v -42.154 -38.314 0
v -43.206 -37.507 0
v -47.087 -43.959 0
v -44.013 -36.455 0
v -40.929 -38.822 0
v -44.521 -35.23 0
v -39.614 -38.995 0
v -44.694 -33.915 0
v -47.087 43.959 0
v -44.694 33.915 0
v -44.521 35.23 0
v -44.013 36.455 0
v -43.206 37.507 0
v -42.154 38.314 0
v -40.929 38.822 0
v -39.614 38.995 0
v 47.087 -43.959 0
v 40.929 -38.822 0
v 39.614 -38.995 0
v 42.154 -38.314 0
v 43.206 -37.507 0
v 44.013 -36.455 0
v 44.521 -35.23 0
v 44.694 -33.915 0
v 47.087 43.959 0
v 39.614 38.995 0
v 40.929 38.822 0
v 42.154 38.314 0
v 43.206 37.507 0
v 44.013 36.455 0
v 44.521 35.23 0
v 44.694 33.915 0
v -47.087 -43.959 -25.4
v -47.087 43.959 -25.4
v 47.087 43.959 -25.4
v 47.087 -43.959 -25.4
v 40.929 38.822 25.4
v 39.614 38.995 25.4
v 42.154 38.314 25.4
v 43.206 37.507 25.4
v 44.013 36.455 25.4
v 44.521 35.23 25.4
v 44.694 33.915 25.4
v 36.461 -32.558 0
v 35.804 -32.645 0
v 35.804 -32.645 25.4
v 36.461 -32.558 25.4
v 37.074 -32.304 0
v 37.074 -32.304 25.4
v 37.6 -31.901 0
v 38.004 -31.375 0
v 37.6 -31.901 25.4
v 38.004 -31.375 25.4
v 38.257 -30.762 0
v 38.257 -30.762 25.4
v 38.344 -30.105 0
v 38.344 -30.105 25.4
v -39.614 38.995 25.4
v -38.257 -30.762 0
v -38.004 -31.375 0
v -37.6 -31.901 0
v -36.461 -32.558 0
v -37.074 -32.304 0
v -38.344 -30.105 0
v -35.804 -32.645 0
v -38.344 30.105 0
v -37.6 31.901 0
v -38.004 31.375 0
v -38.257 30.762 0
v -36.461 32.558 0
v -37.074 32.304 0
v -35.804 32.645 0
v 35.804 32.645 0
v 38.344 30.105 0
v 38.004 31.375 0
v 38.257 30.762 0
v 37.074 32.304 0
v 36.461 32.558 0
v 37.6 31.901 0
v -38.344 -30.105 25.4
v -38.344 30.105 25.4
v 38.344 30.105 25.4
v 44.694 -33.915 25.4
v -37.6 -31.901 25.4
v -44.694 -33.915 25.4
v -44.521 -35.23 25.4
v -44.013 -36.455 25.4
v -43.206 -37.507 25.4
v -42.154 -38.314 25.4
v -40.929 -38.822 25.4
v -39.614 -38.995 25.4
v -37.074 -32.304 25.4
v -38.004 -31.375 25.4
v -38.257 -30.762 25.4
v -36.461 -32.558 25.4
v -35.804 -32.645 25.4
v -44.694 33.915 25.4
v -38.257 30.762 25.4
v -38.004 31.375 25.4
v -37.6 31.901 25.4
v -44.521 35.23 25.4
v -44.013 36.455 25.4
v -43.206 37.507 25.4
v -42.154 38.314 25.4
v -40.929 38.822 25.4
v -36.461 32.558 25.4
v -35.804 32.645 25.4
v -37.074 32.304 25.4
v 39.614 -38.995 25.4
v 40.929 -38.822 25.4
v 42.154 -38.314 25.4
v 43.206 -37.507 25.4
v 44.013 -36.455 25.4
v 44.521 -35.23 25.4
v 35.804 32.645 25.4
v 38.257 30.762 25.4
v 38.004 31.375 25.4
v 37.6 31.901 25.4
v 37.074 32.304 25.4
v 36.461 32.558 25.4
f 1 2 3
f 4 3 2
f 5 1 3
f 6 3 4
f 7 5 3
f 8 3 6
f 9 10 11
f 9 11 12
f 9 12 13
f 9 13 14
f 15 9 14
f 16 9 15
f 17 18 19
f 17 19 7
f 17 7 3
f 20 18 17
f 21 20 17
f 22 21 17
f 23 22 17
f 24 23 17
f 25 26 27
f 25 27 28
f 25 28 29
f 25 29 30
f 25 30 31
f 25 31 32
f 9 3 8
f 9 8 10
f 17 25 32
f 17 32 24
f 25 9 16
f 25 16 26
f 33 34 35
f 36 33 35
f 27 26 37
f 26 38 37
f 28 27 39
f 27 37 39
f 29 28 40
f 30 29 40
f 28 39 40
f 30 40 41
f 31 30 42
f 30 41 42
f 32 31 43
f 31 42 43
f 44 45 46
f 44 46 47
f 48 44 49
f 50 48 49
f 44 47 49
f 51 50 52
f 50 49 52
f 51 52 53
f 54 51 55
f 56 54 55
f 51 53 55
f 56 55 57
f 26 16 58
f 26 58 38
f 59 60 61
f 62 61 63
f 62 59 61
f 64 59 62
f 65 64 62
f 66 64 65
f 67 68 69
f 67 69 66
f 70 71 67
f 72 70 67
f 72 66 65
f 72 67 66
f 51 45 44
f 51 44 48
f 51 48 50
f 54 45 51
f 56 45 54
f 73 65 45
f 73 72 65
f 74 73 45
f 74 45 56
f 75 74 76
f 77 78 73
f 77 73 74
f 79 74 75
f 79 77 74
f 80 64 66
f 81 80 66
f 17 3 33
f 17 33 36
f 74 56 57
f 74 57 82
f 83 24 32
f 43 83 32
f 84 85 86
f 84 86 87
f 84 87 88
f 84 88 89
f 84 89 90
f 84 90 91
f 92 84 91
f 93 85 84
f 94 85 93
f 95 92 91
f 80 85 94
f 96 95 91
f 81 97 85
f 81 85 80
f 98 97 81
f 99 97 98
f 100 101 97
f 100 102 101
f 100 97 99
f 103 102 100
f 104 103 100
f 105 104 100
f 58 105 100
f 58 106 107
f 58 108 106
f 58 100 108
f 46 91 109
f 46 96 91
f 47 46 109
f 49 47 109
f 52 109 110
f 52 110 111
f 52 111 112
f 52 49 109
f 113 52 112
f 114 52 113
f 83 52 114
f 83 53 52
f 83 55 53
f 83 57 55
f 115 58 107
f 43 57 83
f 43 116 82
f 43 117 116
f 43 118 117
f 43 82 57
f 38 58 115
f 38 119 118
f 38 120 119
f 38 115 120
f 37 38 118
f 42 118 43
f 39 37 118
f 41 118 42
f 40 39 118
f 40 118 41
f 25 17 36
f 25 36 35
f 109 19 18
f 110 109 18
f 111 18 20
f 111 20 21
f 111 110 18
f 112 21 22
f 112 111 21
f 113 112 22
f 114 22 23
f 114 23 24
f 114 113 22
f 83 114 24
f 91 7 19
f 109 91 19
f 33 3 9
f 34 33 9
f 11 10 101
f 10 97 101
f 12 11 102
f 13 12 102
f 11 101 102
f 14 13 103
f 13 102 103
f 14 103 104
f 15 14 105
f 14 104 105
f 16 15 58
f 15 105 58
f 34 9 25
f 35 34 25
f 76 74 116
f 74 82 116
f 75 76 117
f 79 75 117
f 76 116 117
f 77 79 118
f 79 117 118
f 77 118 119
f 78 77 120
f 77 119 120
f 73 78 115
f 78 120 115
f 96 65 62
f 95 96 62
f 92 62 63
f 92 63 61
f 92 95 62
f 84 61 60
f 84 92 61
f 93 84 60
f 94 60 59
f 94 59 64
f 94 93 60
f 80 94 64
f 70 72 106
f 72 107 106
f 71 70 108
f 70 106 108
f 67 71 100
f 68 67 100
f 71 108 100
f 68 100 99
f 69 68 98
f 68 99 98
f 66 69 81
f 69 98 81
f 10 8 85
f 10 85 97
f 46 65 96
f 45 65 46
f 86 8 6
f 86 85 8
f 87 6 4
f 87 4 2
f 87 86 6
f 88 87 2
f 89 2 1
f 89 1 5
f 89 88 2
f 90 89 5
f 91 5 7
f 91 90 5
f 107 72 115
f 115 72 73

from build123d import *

# Parameters (mm, degrees)
F0_W     = 89.387954
F0_H     = 77.989534
F0_W_2   = 76.687954
F0_H_2   = 65.289534
F1_DEPTH = 25.4
F2_R     = 5.08
F3_R     = 2.54
F4_W     = 94.174876
F4_H     = 87.917894
F5_DEPTH = 25.4


with BuildPart() as f1:
    # F0 (on Top) → F1 (new body)
    with BuildSketch(Plane.XY):
        Rectangle(F0_W, F0_H)
        Rectangle(F0_W_2, F0_H_2, mode=Mode.SUBTRACT)
    extrude(amount=F1_DEPTH)

    # F2
    f2_edges = [f1.edges().sort_by_distance(p)[0] for p in [
        (-44.693977, -38.994767, 12.7),
        (44.693977, -38.994767, 12.7),
        (44.693977, 38.994767, 12.7),
        (-44.693977, 38.994767, 12.7),
    ]]
    fillet(f2_edges, radius=F2_R)

    # F3
    f3_edges = [f1.edges().sort_by_distance(p)[0] for p in [
        (-38.343977, 32.644767, 12.7),
        (38.343977, 32.644767, 12.7),
        (38.343977, -32.644767, 12.7),
        (-38.343977, -32.644767, 12.7),
    ]]
    fillet(f3_edges, radius=F3_R)

    # F4 (on Top) → F5 (join)
    with BuildSketch(Plane.XY):
        Rectangle(F4_W, F4_H)
    extrude(amount=-F5_DEPTH)


solid = f1.part
